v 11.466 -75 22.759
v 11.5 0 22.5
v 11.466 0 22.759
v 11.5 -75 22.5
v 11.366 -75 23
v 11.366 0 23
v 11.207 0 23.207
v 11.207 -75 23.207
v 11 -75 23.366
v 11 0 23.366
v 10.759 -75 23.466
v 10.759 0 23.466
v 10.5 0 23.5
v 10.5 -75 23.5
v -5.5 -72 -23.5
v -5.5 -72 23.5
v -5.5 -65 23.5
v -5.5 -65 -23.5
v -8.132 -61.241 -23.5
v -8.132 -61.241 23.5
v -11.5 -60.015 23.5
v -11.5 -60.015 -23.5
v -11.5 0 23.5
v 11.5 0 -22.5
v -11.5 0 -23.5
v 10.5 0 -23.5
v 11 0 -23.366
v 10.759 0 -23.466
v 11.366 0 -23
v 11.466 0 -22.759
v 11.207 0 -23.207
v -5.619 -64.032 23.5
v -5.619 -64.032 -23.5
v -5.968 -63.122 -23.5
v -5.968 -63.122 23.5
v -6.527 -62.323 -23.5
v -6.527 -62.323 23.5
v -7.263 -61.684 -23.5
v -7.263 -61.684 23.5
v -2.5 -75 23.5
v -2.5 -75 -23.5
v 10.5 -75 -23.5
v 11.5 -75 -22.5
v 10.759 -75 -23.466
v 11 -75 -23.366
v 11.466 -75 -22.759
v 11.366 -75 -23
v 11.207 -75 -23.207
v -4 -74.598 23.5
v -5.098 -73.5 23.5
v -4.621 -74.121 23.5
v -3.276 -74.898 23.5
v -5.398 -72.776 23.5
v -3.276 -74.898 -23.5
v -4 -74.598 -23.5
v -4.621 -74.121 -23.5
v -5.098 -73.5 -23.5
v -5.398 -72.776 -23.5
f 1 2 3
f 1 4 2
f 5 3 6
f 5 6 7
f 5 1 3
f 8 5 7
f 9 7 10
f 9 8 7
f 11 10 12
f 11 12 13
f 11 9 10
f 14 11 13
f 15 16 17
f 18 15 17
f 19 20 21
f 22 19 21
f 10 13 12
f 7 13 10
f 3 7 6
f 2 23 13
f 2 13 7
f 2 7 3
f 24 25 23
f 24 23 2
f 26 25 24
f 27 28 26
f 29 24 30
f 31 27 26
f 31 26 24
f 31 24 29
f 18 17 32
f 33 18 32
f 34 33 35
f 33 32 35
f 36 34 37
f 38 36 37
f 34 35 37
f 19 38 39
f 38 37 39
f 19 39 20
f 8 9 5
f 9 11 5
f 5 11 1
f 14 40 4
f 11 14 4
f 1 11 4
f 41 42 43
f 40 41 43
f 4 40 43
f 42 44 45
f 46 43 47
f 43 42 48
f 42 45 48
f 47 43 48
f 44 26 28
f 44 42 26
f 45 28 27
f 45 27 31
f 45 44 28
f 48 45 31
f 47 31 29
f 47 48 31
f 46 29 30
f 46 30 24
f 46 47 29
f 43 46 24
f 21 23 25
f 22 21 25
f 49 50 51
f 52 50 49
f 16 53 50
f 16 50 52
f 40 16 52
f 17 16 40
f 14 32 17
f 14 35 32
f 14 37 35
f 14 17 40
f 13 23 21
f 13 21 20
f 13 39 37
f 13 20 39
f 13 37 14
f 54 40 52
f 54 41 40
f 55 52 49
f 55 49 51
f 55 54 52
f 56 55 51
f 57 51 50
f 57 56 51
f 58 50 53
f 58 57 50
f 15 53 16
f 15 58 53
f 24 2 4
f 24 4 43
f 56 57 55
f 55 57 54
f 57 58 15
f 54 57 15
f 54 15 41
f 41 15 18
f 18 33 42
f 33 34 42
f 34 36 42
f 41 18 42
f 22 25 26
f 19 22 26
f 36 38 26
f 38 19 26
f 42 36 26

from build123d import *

# Parameters (mm, degrees)
SKETCH1_W           = 23
SKETCH1_H           = 47
BOSS_EXTRUDE1_DEPTH = 75
CUT_EXTRUDE1_REACH  = 91.254
FILLET1_R           = 3
FILLET2_R           = 1


with BuildPart() as part:
    # Sketch1 → Boss-Extrude1 (new body)
    with BuildSketch(Plane(origin=(0, 0, 0), x_dir=(1, 0, 0), z_dir=(0, 1, 0))):
        Rectangle(SKETCH1_W, SKETCH1_H)
    extrude(amount=-BOSS_EXTRUDE1_DEPTH)

    # Sketch2 → Cut-Extrude1 (cut, up to next)
    with BuildSketch(Plane.XY.offset(23.5), mode=Mode.PRIVATE) as cut_extrude1_sk1:
        with BuildLine():
            Line((-8.131919427, -61.241229517), (-11.5, -60.015348442))
            Line((-11.5, -60.015348442), (-11.5, -75))
            Line((-11.5, -75), (-5.5, -75))
            Line((-5.5, -75), (-5.5, -65))
            ThreePointArc((-5.5, -65), (-6.223391823, -62.705694255), (-8.131919427, -61.241229517))
        make_face()
    cut_extrude1_tool1 = extrude(cut_extrude1_sk1.sketch, amount=-CUT_EXTRUDE1_REACH, mode=Mode.PRIVATE) & part.part
    add(cut_extrude1_tool1.solids().sort_by_distance((-8.622504, -68.134359, 23.5))[0], mode=Mode.SUBTRACT)

    # Fillet1
    fillet1_edges = [part.edges().sort_by_distance(p)[0] for p in [
        (-5.5, -75, 0),
    ]]
    fillet(fillet1_edges, radius=FILLET1_R)

    # Fillet2
    fillet2_edges = [part.edges().sort_by_distance(p)[0] for p in [
        (11.5, -37.5, 23.5),
        (11.5, -37.5, -23.5),
    ]]
    fillet(fillet2_edges, radius=FILLET2_R)


solid = part.part
